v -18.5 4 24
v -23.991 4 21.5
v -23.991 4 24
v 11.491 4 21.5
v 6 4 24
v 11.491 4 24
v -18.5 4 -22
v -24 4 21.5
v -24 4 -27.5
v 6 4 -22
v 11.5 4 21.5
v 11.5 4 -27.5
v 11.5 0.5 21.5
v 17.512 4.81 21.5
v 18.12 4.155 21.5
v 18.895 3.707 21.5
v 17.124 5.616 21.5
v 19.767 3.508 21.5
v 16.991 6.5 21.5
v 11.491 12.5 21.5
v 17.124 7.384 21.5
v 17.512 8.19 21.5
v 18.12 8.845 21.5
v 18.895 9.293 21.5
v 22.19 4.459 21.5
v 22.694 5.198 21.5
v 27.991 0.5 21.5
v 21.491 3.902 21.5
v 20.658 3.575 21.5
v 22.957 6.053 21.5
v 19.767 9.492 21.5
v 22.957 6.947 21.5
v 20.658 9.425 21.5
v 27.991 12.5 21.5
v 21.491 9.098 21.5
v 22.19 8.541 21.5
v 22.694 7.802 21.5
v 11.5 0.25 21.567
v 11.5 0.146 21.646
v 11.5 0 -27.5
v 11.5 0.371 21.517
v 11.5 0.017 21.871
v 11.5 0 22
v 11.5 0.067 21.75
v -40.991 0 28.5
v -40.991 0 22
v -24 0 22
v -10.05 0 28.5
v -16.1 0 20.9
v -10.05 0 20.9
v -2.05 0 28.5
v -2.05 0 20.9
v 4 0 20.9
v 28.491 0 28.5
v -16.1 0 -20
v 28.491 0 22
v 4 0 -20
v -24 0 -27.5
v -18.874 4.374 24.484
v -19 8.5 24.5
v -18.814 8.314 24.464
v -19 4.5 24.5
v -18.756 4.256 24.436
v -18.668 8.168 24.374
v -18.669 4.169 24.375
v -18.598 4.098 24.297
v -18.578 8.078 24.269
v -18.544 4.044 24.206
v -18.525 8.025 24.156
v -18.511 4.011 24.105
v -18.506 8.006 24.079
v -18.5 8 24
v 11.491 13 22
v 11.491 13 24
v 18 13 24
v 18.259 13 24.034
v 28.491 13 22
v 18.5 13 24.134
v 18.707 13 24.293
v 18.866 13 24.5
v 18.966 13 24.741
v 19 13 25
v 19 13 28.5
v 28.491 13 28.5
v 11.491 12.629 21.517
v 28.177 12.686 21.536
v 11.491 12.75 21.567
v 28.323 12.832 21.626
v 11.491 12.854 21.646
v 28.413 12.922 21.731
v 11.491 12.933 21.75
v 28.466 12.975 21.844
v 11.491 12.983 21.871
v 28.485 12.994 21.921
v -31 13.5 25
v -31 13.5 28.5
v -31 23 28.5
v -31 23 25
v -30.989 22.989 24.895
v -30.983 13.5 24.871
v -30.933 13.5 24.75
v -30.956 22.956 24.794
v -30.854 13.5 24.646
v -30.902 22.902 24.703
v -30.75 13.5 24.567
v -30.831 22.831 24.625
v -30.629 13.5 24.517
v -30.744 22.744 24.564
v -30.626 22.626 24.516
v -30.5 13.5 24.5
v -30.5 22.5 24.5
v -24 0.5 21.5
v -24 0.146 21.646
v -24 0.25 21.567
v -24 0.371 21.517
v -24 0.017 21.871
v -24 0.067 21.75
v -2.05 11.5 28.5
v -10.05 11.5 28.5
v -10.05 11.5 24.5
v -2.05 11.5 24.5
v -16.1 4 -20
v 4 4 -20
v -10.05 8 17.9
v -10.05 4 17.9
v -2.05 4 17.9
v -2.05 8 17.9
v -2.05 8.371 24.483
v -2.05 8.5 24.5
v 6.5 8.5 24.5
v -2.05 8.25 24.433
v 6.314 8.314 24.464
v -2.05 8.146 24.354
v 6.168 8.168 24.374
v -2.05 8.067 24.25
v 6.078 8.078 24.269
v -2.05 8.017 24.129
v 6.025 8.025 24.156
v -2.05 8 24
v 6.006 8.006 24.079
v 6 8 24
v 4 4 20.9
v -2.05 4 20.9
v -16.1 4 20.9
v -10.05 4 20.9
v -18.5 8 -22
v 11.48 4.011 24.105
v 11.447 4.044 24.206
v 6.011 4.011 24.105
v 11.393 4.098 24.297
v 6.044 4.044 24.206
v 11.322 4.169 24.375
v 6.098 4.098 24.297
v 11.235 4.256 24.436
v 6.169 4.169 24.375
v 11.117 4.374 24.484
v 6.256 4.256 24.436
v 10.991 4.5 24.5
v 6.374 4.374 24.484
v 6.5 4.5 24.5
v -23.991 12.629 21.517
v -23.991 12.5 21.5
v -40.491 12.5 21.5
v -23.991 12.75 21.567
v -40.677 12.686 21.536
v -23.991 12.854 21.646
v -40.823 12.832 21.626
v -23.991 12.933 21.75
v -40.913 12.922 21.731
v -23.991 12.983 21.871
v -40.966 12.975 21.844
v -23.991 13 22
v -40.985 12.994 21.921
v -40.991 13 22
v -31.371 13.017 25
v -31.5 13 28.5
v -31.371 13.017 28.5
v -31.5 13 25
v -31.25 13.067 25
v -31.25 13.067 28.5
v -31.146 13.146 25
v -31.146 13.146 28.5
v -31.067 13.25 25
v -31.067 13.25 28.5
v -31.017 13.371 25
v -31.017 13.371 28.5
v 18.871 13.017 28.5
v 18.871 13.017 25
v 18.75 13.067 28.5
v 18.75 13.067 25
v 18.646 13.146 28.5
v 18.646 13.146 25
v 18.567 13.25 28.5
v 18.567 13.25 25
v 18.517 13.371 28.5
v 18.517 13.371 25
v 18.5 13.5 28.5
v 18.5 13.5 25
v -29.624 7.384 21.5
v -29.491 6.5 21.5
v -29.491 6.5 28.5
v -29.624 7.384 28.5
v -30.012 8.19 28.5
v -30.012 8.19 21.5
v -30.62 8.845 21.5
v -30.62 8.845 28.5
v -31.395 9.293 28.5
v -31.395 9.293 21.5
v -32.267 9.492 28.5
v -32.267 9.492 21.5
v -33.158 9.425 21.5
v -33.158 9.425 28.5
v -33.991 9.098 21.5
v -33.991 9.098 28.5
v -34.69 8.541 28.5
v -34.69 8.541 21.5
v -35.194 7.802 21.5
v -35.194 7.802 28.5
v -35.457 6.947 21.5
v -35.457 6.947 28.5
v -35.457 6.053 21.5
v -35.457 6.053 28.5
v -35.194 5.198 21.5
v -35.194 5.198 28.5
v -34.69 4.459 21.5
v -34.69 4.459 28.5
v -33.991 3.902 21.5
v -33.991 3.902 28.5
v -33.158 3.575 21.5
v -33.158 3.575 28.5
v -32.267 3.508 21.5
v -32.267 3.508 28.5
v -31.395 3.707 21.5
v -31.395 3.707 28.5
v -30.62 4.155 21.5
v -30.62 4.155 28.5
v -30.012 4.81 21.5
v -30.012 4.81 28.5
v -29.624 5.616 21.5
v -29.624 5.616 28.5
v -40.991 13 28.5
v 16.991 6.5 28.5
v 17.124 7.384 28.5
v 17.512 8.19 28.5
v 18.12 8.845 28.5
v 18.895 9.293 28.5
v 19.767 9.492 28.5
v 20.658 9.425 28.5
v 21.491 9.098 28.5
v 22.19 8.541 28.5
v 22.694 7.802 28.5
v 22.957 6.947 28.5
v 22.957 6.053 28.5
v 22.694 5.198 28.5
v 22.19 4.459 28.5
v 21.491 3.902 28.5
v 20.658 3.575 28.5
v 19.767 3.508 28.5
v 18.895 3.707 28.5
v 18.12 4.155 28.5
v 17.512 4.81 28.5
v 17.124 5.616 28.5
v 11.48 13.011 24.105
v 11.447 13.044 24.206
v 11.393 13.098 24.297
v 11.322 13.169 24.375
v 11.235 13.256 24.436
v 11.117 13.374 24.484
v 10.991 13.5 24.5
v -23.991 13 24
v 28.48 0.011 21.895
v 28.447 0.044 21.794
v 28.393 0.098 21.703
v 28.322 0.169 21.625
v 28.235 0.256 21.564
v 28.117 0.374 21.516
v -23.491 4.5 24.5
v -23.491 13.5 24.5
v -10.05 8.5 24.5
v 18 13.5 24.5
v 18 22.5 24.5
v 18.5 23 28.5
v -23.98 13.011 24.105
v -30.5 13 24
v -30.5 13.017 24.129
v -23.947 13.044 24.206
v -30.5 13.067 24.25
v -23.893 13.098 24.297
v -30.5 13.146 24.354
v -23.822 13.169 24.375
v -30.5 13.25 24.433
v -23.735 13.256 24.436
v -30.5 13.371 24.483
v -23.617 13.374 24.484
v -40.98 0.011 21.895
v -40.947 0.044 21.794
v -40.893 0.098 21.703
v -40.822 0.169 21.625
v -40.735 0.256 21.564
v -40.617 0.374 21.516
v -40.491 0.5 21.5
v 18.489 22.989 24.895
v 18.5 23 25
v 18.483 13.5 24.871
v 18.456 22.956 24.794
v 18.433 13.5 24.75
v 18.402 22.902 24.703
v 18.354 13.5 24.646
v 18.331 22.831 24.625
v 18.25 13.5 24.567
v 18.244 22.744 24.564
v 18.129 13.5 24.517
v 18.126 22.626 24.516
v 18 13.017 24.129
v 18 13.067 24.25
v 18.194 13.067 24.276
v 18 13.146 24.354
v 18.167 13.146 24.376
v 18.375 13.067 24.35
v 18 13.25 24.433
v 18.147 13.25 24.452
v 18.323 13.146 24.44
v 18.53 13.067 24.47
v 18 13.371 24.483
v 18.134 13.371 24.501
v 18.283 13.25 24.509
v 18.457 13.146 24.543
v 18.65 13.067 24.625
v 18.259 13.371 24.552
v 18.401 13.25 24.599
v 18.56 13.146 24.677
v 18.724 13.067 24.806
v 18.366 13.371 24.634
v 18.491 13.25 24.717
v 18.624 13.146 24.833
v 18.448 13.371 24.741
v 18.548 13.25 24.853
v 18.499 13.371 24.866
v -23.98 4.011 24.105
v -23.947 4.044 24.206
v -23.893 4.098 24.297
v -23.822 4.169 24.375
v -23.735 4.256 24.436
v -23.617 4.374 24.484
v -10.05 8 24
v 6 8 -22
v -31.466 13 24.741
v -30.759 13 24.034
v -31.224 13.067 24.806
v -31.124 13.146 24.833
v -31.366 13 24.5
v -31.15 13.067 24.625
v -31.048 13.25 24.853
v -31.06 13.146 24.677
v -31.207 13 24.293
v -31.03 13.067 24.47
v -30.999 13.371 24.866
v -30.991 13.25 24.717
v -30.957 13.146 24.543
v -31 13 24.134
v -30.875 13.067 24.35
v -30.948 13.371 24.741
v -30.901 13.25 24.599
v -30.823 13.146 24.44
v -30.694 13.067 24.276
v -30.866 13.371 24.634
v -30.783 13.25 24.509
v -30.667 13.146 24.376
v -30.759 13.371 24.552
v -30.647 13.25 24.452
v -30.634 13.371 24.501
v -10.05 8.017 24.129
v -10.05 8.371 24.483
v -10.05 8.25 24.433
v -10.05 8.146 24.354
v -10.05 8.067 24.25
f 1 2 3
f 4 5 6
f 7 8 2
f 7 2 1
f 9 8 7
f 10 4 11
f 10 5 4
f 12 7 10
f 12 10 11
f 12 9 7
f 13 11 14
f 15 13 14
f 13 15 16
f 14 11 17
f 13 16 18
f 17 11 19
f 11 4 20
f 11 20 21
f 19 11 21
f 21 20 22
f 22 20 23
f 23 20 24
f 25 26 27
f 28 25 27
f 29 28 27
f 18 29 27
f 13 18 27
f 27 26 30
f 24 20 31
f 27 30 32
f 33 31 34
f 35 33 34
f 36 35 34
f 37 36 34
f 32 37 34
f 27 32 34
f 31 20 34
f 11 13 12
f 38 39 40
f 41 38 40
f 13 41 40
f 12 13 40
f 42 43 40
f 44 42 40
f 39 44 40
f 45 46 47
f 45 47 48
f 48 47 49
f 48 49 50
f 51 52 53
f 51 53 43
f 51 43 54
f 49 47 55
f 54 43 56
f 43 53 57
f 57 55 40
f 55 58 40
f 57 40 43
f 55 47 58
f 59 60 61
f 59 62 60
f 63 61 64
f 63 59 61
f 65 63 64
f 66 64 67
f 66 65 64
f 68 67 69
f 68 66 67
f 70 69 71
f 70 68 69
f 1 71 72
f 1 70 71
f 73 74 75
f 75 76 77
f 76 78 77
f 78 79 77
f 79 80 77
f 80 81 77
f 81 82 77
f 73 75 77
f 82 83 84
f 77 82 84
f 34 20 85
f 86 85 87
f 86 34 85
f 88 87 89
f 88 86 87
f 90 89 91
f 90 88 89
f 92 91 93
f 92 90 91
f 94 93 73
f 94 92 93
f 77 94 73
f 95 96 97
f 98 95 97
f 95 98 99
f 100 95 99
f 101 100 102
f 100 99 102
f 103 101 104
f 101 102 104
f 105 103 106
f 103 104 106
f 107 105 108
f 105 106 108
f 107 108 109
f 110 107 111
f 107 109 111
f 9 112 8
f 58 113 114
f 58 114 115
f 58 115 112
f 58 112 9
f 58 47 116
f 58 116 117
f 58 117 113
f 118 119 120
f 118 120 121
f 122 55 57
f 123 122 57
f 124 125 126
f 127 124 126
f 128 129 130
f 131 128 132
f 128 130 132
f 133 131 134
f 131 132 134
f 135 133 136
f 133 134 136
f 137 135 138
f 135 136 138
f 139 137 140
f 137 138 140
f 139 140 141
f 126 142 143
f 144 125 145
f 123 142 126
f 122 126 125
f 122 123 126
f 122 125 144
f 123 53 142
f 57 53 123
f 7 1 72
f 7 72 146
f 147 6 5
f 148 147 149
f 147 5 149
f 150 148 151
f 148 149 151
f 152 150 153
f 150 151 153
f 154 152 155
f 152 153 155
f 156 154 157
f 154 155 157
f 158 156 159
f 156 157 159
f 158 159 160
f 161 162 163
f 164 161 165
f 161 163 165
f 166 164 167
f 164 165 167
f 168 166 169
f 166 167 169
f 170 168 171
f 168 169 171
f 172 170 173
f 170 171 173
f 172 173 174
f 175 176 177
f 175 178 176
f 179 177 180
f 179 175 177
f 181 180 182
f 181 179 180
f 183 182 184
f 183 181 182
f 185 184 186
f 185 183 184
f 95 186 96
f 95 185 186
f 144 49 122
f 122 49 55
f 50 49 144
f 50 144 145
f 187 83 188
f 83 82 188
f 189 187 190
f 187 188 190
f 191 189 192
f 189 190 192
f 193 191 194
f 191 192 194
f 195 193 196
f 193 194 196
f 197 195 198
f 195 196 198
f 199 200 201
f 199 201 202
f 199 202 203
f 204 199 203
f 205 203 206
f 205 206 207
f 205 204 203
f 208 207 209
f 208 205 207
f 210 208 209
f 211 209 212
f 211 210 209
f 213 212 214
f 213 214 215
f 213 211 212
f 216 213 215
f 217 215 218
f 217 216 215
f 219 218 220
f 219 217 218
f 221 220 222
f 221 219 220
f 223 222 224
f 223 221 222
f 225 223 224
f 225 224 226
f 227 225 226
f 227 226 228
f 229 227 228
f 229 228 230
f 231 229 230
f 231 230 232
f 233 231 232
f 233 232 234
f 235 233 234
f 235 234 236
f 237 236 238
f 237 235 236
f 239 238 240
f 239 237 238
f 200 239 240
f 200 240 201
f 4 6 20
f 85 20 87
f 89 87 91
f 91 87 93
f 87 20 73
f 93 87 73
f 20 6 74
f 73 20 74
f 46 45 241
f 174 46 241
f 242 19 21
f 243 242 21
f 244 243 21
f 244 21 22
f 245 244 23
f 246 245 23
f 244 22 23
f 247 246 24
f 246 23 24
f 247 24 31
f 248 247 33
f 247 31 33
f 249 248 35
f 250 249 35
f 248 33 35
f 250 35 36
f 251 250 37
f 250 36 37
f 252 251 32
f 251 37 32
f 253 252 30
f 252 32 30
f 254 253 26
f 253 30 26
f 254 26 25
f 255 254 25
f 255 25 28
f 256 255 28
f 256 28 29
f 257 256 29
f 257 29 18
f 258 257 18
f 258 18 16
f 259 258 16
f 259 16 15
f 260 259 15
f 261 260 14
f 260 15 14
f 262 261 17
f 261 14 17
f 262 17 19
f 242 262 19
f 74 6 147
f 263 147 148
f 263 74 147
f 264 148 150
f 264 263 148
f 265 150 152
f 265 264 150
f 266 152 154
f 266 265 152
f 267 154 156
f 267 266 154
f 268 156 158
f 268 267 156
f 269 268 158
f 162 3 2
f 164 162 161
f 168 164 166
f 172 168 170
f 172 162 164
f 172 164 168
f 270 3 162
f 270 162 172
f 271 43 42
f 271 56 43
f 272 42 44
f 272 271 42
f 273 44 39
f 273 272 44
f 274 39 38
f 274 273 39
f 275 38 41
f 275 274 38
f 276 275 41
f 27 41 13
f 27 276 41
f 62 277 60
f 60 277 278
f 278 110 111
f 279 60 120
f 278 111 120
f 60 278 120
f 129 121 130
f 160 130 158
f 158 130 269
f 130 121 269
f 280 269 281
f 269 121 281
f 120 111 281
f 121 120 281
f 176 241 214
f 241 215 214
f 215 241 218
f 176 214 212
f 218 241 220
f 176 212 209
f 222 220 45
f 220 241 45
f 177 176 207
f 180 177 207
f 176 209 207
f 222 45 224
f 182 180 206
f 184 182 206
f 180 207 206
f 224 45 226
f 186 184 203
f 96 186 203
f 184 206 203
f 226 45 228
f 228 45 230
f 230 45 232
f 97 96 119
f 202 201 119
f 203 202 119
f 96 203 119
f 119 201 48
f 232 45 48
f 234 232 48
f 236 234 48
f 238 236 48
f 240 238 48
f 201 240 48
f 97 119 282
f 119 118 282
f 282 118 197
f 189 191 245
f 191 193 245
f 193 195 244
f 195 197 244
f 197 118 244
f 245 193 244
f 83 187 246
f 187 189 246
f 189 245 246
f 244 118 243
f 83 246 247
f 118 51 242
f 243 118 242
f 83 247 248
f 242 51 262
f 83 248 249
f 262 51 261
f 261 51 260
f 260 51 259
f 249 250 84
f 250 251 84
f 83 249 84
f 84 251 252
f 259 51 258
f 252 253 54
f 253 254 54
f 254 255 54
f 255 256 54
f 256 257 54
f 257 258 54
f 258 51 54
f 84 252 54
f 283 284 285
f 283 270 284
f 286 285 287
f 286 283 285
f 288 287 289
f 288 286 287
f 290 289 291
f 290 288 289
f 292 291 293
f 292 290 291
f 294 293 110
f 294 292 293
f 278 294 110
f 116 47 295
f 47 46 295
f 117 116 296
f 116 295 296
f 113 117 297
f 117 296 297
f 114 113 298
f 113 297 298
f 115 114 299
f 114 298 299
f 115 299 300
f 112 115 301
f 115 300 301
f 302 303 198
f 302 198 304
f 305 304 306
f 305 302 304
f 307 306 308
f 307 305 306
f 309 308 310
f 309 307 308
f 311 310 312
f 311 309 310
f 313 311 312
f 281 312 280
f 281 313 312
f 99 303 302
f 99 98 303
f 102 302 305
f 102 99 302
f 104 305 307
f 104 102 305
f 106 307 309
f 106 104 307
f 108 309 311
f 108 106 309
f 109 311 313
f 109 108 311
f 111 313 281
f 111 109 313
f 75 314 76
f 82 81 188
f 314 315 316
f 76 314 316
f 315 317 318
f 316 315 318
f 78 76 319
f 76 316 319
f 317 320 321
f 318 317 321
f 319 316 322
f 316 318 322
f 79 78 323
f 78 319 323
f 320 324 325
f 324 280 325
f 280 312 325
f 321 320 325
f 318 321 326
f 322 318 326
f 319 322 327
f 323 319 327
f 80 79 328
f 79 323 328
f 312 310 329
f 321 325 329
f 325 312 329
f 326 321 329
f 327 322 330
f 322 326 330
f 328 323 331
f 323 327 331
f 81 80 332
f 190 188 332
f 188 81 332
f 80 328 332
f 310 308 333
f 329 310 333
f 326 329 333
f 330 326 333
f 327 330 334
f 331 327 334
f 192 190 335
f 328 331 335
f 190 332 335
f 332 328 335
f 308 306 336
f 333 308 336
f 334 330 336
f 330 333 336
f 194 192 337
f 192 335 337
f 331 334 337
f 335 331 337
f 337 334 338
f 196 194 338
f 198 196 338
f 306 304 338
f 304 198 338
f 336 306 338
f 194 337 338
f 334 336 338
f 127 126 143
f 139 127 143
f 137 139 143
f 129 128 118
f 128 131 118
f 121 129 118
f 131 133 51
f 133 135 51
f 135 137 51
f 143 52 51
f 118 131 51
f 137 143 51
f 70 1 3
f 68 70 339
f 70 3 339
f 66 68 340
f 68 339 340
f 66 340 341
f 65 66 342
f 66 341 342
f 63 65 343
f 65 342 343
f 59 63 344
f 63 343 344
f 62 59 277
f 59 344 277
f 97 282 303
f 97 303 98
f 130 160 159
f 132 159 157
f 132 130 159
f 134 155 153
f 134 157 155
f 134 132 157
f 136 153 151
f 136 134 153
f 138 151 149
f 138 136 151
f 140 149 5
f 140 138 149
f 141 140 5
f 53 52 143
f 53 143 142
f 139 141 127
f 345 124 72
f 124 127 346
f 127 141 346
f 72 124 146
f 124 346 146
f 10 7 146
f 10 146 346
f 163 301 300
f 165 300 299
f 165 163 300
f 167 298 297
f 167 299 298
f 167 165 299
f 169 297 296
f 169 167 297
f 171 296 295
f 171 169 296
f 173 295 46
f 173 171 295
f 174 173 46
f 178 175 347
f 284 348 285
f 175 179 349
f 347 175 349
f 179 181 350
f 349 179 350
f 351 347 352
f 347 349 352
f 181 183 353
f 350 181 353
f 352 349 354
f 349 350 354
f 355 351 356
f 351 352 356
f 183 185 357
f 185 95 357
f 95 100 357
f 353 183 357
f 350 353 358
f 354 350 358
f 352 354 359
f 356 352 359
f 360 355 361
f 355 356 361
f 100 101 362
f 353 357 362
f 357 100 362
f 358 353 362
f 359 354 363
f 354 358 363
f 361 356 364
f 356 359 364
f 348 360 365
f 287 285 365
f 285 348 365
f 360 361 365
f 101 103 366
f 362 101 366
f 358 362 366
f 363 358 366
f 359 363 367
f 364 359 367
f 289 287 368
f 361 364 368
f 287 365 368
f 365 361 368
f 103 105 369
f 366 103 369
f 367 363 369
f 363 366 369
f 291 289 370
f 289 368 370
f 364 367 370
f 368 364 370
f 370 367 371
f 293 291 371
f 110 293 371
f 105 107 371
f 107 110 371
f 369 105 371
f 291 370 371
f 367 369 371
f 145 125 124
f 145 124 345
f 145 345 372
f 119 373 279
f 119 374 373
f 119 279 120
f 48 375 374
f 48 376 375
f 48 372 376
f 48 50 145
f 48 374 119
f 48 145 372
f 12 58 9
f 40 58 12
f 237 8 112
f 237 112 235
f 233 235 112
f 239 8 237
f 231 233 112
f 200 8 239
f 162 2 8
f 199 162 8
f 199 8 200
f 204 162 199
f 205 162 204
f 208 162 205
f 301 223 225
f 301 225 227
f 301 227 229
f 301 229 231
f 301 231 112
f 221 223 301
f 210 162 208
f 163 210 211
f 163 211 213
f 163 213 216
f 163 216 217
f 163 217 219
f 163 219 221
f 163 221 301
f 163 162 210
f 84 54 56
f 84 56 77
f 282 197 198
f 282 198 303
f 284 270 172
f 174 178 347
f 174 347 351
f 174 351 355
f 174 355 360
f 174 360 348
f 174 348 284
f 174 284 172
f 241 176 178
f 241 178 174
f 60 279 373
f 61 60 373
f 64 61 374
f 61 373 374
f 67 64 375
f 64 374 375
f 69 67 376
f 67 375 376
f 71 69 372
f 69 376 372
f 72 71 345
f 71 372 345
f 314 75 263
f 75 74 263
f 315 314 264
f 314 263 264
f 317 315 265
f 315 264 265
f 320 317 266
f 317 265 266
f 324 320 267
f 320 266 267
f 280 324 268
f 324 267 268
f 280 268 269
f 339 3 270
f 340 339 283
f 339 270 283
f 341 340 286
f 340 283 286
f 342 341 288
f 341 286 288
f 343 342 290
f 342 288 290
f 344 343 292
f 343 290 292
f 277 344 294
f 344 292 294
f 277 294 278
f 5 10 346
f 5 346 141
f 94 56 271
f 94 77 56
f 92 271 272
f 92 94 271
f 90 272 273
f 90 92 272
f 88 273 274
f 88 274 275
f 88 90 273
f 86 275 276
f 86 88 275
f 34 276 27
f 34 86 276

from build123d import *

# Parameters (mm, degrees)
ESQUISSE1_W             = 35.5
ESQUISSE1_H             = 56
ESQUISSE1_W_2           = 20.1
ESQUISSE1_H_2           = 40.9
BOSS_EXTRU_1_DEPTH      = 4
BOSS_EXTRU_2_DEPTH      = 4
BOSS_EXTRU_5_DEPTH      = 4
ESQUISSE10_W            = 17
ESQUISSE10_H            = 13
BOSS_EXTRU_6_DEPTH      = 7
ESQUISSE11_R            = 3
ENL_V_MAT_EXTRU_1_DEPTH = 7
CONG_1_R                = 0.5
ESQUISSE12_W            = 8
ESQUISSE12_H            = 10.6
ENL_V_MAT_EXTRU_2_DEPTH = 11.5


with BuildPart() as part:
    # Esquisse1 → Boss.-Extru.1 (new body)
    with BuildSketch(Plane(origin=(0, 0, 0), x_dir=(1, 0, 0), z_dir=(0, 1, 0))):
        with Locations((-6.25, -0.5)):
            Rectangle(ESQUISSE1_W, ESQUISSE1_H)
        with Locations((-6.05, -0.45)):
            Rectangle(ESQUISSE1_W_2, ESQUISSE1_H_2, mode=Mode.SUBTRACT)
    extrude(amount=BOSS_EXTRU_1_DEPTH)

    # Esquisse5 → Boss.-Extru.2 (add)
    with BuildSketch(Plane.XY.offset(28.5)):
        Polygon((-6.25, 8), (-6.25, 4), (-6.25, 0), (11.5, 0), (11.5, 13), (18.5, 13), (18.5, 18), (18.5, 23), (-6.25, 23), (-6.25, 18), align=None)
    boss_extru_2 = extrude(amount=-BOSS_EXTRU_2_DEPTH)

    # Symétrie1: Boss.-Extru.2 across plane
    add(boss_extru_2.mirror(Plane(origin=(-6.25, 4, 24.5), x_dir=(0, 0, 1), z_dir=(-1, 0, 0))))

    # Esquisse9 → Boss.-Extru.5 (add)
    with BuildSketch(Plane(origin=(0, 4, 0), x_dir=(-1, 0, 0), z_dir=(0, -1, 0))):
        Polygon((18.5, -25.5), (18.5, -23), (18.5, 20), (18.5, 22), (-6, 22), (-6, -25.5), align=None)
    extrude(amount=-BOSS_EXTRU_5_DEPTH)

    # Esquisse10 → Boss.-Extru.6 (add)
    with BuildSketch(Plane.XY.offset(28.5)):
        with Locations((19.990927164, 6.5)):
            Rectangle(ESQUISSE10_W, ESQUISSE10_H)
    boss_extru_6 = extrude(amount=-BOSS_EXTRU_6_DEPTH)

    # Symétrie2: Boss.-Extru.6 across plane
    add(boss_extru_6.mirror(Plane(origin=(-6.25, 0, 0), x_dir=(0, 0, 1), z_dir=(1, 0, 0))))

    # Esquisse11 → Enlèv. mat.-Extru.1 (cut)
    with BuildSketch(Plane(origin=(0, 0, 21.5), x_dir=(-1, 0, 0), z_dir=(0, 0, -1))):
        with Locations((-19.990927164, 6.5)):
            Circle(ESQUISSE11_R)
    enl_v_mat_extru_1 = extrude(amount=-ENL_V_MAT_EXTRU_1_DEPTH, mode=Mode.SUBTRACT)

    # Symétrie3: Enlèv. mat.-Extru.1 across plane
    add(enl_v_mat_extru_1.mirror(Plane(origin=(-6.25, 0, 0), x_dir=(0, 0, 1), z_dir=(1, 0, 0))), mode=Mode.SUBTRACT)

    # Congé1
    cong_1_edges = [part.edges().sort_by_distance(p)[0] for p in [
        (19.995463582, 0, 21.5),
        (11.490927164, 8.5, 24.5),
        (19.990927164, 13, 21.5),
        (28.490927164, 6.5, 21.5),
        (-21.245463582, 4, 24.5),
        (-23.990927164, 8.5, 24.5),
        (-32.495463582, 0, 21.5),
        (-40.990927164, 6.5, 21.5),
        (-32.490927164, 13, 21.5),
        (14.995463582, 13, 24.5),
        (18.5, 13, 26.5),
        (-6.25, 23, 24.5),
        (18.5, 18, 24.5),
        (-31, 13, 26.5),
        (-27.495463582, 13, 24.5),
        (-31, 18, 24.5),
        (8.745463582, 4, 24.5),
        (-6.25, 8, 24.5),
        (6, 6, 24.5),
        (-18.5, 6, 24.5),
    ]]
    fillet(cong_1_edges, radius=CONG_1_R)

    # Esquisse12 → Enlèv. mat.-Extru.2 (cut)
    with BuildSketch(Plane.XZ):
        with Locations((-6.05, 23.2)):
            Rectangle(ESQUISSE12_W, ESQUISSE12_H)
    extrude(amount=-ENL_V_MAT_EXTRU_2_DEPTH, mode=Mode.SUBTRACT)


solid = part.part
